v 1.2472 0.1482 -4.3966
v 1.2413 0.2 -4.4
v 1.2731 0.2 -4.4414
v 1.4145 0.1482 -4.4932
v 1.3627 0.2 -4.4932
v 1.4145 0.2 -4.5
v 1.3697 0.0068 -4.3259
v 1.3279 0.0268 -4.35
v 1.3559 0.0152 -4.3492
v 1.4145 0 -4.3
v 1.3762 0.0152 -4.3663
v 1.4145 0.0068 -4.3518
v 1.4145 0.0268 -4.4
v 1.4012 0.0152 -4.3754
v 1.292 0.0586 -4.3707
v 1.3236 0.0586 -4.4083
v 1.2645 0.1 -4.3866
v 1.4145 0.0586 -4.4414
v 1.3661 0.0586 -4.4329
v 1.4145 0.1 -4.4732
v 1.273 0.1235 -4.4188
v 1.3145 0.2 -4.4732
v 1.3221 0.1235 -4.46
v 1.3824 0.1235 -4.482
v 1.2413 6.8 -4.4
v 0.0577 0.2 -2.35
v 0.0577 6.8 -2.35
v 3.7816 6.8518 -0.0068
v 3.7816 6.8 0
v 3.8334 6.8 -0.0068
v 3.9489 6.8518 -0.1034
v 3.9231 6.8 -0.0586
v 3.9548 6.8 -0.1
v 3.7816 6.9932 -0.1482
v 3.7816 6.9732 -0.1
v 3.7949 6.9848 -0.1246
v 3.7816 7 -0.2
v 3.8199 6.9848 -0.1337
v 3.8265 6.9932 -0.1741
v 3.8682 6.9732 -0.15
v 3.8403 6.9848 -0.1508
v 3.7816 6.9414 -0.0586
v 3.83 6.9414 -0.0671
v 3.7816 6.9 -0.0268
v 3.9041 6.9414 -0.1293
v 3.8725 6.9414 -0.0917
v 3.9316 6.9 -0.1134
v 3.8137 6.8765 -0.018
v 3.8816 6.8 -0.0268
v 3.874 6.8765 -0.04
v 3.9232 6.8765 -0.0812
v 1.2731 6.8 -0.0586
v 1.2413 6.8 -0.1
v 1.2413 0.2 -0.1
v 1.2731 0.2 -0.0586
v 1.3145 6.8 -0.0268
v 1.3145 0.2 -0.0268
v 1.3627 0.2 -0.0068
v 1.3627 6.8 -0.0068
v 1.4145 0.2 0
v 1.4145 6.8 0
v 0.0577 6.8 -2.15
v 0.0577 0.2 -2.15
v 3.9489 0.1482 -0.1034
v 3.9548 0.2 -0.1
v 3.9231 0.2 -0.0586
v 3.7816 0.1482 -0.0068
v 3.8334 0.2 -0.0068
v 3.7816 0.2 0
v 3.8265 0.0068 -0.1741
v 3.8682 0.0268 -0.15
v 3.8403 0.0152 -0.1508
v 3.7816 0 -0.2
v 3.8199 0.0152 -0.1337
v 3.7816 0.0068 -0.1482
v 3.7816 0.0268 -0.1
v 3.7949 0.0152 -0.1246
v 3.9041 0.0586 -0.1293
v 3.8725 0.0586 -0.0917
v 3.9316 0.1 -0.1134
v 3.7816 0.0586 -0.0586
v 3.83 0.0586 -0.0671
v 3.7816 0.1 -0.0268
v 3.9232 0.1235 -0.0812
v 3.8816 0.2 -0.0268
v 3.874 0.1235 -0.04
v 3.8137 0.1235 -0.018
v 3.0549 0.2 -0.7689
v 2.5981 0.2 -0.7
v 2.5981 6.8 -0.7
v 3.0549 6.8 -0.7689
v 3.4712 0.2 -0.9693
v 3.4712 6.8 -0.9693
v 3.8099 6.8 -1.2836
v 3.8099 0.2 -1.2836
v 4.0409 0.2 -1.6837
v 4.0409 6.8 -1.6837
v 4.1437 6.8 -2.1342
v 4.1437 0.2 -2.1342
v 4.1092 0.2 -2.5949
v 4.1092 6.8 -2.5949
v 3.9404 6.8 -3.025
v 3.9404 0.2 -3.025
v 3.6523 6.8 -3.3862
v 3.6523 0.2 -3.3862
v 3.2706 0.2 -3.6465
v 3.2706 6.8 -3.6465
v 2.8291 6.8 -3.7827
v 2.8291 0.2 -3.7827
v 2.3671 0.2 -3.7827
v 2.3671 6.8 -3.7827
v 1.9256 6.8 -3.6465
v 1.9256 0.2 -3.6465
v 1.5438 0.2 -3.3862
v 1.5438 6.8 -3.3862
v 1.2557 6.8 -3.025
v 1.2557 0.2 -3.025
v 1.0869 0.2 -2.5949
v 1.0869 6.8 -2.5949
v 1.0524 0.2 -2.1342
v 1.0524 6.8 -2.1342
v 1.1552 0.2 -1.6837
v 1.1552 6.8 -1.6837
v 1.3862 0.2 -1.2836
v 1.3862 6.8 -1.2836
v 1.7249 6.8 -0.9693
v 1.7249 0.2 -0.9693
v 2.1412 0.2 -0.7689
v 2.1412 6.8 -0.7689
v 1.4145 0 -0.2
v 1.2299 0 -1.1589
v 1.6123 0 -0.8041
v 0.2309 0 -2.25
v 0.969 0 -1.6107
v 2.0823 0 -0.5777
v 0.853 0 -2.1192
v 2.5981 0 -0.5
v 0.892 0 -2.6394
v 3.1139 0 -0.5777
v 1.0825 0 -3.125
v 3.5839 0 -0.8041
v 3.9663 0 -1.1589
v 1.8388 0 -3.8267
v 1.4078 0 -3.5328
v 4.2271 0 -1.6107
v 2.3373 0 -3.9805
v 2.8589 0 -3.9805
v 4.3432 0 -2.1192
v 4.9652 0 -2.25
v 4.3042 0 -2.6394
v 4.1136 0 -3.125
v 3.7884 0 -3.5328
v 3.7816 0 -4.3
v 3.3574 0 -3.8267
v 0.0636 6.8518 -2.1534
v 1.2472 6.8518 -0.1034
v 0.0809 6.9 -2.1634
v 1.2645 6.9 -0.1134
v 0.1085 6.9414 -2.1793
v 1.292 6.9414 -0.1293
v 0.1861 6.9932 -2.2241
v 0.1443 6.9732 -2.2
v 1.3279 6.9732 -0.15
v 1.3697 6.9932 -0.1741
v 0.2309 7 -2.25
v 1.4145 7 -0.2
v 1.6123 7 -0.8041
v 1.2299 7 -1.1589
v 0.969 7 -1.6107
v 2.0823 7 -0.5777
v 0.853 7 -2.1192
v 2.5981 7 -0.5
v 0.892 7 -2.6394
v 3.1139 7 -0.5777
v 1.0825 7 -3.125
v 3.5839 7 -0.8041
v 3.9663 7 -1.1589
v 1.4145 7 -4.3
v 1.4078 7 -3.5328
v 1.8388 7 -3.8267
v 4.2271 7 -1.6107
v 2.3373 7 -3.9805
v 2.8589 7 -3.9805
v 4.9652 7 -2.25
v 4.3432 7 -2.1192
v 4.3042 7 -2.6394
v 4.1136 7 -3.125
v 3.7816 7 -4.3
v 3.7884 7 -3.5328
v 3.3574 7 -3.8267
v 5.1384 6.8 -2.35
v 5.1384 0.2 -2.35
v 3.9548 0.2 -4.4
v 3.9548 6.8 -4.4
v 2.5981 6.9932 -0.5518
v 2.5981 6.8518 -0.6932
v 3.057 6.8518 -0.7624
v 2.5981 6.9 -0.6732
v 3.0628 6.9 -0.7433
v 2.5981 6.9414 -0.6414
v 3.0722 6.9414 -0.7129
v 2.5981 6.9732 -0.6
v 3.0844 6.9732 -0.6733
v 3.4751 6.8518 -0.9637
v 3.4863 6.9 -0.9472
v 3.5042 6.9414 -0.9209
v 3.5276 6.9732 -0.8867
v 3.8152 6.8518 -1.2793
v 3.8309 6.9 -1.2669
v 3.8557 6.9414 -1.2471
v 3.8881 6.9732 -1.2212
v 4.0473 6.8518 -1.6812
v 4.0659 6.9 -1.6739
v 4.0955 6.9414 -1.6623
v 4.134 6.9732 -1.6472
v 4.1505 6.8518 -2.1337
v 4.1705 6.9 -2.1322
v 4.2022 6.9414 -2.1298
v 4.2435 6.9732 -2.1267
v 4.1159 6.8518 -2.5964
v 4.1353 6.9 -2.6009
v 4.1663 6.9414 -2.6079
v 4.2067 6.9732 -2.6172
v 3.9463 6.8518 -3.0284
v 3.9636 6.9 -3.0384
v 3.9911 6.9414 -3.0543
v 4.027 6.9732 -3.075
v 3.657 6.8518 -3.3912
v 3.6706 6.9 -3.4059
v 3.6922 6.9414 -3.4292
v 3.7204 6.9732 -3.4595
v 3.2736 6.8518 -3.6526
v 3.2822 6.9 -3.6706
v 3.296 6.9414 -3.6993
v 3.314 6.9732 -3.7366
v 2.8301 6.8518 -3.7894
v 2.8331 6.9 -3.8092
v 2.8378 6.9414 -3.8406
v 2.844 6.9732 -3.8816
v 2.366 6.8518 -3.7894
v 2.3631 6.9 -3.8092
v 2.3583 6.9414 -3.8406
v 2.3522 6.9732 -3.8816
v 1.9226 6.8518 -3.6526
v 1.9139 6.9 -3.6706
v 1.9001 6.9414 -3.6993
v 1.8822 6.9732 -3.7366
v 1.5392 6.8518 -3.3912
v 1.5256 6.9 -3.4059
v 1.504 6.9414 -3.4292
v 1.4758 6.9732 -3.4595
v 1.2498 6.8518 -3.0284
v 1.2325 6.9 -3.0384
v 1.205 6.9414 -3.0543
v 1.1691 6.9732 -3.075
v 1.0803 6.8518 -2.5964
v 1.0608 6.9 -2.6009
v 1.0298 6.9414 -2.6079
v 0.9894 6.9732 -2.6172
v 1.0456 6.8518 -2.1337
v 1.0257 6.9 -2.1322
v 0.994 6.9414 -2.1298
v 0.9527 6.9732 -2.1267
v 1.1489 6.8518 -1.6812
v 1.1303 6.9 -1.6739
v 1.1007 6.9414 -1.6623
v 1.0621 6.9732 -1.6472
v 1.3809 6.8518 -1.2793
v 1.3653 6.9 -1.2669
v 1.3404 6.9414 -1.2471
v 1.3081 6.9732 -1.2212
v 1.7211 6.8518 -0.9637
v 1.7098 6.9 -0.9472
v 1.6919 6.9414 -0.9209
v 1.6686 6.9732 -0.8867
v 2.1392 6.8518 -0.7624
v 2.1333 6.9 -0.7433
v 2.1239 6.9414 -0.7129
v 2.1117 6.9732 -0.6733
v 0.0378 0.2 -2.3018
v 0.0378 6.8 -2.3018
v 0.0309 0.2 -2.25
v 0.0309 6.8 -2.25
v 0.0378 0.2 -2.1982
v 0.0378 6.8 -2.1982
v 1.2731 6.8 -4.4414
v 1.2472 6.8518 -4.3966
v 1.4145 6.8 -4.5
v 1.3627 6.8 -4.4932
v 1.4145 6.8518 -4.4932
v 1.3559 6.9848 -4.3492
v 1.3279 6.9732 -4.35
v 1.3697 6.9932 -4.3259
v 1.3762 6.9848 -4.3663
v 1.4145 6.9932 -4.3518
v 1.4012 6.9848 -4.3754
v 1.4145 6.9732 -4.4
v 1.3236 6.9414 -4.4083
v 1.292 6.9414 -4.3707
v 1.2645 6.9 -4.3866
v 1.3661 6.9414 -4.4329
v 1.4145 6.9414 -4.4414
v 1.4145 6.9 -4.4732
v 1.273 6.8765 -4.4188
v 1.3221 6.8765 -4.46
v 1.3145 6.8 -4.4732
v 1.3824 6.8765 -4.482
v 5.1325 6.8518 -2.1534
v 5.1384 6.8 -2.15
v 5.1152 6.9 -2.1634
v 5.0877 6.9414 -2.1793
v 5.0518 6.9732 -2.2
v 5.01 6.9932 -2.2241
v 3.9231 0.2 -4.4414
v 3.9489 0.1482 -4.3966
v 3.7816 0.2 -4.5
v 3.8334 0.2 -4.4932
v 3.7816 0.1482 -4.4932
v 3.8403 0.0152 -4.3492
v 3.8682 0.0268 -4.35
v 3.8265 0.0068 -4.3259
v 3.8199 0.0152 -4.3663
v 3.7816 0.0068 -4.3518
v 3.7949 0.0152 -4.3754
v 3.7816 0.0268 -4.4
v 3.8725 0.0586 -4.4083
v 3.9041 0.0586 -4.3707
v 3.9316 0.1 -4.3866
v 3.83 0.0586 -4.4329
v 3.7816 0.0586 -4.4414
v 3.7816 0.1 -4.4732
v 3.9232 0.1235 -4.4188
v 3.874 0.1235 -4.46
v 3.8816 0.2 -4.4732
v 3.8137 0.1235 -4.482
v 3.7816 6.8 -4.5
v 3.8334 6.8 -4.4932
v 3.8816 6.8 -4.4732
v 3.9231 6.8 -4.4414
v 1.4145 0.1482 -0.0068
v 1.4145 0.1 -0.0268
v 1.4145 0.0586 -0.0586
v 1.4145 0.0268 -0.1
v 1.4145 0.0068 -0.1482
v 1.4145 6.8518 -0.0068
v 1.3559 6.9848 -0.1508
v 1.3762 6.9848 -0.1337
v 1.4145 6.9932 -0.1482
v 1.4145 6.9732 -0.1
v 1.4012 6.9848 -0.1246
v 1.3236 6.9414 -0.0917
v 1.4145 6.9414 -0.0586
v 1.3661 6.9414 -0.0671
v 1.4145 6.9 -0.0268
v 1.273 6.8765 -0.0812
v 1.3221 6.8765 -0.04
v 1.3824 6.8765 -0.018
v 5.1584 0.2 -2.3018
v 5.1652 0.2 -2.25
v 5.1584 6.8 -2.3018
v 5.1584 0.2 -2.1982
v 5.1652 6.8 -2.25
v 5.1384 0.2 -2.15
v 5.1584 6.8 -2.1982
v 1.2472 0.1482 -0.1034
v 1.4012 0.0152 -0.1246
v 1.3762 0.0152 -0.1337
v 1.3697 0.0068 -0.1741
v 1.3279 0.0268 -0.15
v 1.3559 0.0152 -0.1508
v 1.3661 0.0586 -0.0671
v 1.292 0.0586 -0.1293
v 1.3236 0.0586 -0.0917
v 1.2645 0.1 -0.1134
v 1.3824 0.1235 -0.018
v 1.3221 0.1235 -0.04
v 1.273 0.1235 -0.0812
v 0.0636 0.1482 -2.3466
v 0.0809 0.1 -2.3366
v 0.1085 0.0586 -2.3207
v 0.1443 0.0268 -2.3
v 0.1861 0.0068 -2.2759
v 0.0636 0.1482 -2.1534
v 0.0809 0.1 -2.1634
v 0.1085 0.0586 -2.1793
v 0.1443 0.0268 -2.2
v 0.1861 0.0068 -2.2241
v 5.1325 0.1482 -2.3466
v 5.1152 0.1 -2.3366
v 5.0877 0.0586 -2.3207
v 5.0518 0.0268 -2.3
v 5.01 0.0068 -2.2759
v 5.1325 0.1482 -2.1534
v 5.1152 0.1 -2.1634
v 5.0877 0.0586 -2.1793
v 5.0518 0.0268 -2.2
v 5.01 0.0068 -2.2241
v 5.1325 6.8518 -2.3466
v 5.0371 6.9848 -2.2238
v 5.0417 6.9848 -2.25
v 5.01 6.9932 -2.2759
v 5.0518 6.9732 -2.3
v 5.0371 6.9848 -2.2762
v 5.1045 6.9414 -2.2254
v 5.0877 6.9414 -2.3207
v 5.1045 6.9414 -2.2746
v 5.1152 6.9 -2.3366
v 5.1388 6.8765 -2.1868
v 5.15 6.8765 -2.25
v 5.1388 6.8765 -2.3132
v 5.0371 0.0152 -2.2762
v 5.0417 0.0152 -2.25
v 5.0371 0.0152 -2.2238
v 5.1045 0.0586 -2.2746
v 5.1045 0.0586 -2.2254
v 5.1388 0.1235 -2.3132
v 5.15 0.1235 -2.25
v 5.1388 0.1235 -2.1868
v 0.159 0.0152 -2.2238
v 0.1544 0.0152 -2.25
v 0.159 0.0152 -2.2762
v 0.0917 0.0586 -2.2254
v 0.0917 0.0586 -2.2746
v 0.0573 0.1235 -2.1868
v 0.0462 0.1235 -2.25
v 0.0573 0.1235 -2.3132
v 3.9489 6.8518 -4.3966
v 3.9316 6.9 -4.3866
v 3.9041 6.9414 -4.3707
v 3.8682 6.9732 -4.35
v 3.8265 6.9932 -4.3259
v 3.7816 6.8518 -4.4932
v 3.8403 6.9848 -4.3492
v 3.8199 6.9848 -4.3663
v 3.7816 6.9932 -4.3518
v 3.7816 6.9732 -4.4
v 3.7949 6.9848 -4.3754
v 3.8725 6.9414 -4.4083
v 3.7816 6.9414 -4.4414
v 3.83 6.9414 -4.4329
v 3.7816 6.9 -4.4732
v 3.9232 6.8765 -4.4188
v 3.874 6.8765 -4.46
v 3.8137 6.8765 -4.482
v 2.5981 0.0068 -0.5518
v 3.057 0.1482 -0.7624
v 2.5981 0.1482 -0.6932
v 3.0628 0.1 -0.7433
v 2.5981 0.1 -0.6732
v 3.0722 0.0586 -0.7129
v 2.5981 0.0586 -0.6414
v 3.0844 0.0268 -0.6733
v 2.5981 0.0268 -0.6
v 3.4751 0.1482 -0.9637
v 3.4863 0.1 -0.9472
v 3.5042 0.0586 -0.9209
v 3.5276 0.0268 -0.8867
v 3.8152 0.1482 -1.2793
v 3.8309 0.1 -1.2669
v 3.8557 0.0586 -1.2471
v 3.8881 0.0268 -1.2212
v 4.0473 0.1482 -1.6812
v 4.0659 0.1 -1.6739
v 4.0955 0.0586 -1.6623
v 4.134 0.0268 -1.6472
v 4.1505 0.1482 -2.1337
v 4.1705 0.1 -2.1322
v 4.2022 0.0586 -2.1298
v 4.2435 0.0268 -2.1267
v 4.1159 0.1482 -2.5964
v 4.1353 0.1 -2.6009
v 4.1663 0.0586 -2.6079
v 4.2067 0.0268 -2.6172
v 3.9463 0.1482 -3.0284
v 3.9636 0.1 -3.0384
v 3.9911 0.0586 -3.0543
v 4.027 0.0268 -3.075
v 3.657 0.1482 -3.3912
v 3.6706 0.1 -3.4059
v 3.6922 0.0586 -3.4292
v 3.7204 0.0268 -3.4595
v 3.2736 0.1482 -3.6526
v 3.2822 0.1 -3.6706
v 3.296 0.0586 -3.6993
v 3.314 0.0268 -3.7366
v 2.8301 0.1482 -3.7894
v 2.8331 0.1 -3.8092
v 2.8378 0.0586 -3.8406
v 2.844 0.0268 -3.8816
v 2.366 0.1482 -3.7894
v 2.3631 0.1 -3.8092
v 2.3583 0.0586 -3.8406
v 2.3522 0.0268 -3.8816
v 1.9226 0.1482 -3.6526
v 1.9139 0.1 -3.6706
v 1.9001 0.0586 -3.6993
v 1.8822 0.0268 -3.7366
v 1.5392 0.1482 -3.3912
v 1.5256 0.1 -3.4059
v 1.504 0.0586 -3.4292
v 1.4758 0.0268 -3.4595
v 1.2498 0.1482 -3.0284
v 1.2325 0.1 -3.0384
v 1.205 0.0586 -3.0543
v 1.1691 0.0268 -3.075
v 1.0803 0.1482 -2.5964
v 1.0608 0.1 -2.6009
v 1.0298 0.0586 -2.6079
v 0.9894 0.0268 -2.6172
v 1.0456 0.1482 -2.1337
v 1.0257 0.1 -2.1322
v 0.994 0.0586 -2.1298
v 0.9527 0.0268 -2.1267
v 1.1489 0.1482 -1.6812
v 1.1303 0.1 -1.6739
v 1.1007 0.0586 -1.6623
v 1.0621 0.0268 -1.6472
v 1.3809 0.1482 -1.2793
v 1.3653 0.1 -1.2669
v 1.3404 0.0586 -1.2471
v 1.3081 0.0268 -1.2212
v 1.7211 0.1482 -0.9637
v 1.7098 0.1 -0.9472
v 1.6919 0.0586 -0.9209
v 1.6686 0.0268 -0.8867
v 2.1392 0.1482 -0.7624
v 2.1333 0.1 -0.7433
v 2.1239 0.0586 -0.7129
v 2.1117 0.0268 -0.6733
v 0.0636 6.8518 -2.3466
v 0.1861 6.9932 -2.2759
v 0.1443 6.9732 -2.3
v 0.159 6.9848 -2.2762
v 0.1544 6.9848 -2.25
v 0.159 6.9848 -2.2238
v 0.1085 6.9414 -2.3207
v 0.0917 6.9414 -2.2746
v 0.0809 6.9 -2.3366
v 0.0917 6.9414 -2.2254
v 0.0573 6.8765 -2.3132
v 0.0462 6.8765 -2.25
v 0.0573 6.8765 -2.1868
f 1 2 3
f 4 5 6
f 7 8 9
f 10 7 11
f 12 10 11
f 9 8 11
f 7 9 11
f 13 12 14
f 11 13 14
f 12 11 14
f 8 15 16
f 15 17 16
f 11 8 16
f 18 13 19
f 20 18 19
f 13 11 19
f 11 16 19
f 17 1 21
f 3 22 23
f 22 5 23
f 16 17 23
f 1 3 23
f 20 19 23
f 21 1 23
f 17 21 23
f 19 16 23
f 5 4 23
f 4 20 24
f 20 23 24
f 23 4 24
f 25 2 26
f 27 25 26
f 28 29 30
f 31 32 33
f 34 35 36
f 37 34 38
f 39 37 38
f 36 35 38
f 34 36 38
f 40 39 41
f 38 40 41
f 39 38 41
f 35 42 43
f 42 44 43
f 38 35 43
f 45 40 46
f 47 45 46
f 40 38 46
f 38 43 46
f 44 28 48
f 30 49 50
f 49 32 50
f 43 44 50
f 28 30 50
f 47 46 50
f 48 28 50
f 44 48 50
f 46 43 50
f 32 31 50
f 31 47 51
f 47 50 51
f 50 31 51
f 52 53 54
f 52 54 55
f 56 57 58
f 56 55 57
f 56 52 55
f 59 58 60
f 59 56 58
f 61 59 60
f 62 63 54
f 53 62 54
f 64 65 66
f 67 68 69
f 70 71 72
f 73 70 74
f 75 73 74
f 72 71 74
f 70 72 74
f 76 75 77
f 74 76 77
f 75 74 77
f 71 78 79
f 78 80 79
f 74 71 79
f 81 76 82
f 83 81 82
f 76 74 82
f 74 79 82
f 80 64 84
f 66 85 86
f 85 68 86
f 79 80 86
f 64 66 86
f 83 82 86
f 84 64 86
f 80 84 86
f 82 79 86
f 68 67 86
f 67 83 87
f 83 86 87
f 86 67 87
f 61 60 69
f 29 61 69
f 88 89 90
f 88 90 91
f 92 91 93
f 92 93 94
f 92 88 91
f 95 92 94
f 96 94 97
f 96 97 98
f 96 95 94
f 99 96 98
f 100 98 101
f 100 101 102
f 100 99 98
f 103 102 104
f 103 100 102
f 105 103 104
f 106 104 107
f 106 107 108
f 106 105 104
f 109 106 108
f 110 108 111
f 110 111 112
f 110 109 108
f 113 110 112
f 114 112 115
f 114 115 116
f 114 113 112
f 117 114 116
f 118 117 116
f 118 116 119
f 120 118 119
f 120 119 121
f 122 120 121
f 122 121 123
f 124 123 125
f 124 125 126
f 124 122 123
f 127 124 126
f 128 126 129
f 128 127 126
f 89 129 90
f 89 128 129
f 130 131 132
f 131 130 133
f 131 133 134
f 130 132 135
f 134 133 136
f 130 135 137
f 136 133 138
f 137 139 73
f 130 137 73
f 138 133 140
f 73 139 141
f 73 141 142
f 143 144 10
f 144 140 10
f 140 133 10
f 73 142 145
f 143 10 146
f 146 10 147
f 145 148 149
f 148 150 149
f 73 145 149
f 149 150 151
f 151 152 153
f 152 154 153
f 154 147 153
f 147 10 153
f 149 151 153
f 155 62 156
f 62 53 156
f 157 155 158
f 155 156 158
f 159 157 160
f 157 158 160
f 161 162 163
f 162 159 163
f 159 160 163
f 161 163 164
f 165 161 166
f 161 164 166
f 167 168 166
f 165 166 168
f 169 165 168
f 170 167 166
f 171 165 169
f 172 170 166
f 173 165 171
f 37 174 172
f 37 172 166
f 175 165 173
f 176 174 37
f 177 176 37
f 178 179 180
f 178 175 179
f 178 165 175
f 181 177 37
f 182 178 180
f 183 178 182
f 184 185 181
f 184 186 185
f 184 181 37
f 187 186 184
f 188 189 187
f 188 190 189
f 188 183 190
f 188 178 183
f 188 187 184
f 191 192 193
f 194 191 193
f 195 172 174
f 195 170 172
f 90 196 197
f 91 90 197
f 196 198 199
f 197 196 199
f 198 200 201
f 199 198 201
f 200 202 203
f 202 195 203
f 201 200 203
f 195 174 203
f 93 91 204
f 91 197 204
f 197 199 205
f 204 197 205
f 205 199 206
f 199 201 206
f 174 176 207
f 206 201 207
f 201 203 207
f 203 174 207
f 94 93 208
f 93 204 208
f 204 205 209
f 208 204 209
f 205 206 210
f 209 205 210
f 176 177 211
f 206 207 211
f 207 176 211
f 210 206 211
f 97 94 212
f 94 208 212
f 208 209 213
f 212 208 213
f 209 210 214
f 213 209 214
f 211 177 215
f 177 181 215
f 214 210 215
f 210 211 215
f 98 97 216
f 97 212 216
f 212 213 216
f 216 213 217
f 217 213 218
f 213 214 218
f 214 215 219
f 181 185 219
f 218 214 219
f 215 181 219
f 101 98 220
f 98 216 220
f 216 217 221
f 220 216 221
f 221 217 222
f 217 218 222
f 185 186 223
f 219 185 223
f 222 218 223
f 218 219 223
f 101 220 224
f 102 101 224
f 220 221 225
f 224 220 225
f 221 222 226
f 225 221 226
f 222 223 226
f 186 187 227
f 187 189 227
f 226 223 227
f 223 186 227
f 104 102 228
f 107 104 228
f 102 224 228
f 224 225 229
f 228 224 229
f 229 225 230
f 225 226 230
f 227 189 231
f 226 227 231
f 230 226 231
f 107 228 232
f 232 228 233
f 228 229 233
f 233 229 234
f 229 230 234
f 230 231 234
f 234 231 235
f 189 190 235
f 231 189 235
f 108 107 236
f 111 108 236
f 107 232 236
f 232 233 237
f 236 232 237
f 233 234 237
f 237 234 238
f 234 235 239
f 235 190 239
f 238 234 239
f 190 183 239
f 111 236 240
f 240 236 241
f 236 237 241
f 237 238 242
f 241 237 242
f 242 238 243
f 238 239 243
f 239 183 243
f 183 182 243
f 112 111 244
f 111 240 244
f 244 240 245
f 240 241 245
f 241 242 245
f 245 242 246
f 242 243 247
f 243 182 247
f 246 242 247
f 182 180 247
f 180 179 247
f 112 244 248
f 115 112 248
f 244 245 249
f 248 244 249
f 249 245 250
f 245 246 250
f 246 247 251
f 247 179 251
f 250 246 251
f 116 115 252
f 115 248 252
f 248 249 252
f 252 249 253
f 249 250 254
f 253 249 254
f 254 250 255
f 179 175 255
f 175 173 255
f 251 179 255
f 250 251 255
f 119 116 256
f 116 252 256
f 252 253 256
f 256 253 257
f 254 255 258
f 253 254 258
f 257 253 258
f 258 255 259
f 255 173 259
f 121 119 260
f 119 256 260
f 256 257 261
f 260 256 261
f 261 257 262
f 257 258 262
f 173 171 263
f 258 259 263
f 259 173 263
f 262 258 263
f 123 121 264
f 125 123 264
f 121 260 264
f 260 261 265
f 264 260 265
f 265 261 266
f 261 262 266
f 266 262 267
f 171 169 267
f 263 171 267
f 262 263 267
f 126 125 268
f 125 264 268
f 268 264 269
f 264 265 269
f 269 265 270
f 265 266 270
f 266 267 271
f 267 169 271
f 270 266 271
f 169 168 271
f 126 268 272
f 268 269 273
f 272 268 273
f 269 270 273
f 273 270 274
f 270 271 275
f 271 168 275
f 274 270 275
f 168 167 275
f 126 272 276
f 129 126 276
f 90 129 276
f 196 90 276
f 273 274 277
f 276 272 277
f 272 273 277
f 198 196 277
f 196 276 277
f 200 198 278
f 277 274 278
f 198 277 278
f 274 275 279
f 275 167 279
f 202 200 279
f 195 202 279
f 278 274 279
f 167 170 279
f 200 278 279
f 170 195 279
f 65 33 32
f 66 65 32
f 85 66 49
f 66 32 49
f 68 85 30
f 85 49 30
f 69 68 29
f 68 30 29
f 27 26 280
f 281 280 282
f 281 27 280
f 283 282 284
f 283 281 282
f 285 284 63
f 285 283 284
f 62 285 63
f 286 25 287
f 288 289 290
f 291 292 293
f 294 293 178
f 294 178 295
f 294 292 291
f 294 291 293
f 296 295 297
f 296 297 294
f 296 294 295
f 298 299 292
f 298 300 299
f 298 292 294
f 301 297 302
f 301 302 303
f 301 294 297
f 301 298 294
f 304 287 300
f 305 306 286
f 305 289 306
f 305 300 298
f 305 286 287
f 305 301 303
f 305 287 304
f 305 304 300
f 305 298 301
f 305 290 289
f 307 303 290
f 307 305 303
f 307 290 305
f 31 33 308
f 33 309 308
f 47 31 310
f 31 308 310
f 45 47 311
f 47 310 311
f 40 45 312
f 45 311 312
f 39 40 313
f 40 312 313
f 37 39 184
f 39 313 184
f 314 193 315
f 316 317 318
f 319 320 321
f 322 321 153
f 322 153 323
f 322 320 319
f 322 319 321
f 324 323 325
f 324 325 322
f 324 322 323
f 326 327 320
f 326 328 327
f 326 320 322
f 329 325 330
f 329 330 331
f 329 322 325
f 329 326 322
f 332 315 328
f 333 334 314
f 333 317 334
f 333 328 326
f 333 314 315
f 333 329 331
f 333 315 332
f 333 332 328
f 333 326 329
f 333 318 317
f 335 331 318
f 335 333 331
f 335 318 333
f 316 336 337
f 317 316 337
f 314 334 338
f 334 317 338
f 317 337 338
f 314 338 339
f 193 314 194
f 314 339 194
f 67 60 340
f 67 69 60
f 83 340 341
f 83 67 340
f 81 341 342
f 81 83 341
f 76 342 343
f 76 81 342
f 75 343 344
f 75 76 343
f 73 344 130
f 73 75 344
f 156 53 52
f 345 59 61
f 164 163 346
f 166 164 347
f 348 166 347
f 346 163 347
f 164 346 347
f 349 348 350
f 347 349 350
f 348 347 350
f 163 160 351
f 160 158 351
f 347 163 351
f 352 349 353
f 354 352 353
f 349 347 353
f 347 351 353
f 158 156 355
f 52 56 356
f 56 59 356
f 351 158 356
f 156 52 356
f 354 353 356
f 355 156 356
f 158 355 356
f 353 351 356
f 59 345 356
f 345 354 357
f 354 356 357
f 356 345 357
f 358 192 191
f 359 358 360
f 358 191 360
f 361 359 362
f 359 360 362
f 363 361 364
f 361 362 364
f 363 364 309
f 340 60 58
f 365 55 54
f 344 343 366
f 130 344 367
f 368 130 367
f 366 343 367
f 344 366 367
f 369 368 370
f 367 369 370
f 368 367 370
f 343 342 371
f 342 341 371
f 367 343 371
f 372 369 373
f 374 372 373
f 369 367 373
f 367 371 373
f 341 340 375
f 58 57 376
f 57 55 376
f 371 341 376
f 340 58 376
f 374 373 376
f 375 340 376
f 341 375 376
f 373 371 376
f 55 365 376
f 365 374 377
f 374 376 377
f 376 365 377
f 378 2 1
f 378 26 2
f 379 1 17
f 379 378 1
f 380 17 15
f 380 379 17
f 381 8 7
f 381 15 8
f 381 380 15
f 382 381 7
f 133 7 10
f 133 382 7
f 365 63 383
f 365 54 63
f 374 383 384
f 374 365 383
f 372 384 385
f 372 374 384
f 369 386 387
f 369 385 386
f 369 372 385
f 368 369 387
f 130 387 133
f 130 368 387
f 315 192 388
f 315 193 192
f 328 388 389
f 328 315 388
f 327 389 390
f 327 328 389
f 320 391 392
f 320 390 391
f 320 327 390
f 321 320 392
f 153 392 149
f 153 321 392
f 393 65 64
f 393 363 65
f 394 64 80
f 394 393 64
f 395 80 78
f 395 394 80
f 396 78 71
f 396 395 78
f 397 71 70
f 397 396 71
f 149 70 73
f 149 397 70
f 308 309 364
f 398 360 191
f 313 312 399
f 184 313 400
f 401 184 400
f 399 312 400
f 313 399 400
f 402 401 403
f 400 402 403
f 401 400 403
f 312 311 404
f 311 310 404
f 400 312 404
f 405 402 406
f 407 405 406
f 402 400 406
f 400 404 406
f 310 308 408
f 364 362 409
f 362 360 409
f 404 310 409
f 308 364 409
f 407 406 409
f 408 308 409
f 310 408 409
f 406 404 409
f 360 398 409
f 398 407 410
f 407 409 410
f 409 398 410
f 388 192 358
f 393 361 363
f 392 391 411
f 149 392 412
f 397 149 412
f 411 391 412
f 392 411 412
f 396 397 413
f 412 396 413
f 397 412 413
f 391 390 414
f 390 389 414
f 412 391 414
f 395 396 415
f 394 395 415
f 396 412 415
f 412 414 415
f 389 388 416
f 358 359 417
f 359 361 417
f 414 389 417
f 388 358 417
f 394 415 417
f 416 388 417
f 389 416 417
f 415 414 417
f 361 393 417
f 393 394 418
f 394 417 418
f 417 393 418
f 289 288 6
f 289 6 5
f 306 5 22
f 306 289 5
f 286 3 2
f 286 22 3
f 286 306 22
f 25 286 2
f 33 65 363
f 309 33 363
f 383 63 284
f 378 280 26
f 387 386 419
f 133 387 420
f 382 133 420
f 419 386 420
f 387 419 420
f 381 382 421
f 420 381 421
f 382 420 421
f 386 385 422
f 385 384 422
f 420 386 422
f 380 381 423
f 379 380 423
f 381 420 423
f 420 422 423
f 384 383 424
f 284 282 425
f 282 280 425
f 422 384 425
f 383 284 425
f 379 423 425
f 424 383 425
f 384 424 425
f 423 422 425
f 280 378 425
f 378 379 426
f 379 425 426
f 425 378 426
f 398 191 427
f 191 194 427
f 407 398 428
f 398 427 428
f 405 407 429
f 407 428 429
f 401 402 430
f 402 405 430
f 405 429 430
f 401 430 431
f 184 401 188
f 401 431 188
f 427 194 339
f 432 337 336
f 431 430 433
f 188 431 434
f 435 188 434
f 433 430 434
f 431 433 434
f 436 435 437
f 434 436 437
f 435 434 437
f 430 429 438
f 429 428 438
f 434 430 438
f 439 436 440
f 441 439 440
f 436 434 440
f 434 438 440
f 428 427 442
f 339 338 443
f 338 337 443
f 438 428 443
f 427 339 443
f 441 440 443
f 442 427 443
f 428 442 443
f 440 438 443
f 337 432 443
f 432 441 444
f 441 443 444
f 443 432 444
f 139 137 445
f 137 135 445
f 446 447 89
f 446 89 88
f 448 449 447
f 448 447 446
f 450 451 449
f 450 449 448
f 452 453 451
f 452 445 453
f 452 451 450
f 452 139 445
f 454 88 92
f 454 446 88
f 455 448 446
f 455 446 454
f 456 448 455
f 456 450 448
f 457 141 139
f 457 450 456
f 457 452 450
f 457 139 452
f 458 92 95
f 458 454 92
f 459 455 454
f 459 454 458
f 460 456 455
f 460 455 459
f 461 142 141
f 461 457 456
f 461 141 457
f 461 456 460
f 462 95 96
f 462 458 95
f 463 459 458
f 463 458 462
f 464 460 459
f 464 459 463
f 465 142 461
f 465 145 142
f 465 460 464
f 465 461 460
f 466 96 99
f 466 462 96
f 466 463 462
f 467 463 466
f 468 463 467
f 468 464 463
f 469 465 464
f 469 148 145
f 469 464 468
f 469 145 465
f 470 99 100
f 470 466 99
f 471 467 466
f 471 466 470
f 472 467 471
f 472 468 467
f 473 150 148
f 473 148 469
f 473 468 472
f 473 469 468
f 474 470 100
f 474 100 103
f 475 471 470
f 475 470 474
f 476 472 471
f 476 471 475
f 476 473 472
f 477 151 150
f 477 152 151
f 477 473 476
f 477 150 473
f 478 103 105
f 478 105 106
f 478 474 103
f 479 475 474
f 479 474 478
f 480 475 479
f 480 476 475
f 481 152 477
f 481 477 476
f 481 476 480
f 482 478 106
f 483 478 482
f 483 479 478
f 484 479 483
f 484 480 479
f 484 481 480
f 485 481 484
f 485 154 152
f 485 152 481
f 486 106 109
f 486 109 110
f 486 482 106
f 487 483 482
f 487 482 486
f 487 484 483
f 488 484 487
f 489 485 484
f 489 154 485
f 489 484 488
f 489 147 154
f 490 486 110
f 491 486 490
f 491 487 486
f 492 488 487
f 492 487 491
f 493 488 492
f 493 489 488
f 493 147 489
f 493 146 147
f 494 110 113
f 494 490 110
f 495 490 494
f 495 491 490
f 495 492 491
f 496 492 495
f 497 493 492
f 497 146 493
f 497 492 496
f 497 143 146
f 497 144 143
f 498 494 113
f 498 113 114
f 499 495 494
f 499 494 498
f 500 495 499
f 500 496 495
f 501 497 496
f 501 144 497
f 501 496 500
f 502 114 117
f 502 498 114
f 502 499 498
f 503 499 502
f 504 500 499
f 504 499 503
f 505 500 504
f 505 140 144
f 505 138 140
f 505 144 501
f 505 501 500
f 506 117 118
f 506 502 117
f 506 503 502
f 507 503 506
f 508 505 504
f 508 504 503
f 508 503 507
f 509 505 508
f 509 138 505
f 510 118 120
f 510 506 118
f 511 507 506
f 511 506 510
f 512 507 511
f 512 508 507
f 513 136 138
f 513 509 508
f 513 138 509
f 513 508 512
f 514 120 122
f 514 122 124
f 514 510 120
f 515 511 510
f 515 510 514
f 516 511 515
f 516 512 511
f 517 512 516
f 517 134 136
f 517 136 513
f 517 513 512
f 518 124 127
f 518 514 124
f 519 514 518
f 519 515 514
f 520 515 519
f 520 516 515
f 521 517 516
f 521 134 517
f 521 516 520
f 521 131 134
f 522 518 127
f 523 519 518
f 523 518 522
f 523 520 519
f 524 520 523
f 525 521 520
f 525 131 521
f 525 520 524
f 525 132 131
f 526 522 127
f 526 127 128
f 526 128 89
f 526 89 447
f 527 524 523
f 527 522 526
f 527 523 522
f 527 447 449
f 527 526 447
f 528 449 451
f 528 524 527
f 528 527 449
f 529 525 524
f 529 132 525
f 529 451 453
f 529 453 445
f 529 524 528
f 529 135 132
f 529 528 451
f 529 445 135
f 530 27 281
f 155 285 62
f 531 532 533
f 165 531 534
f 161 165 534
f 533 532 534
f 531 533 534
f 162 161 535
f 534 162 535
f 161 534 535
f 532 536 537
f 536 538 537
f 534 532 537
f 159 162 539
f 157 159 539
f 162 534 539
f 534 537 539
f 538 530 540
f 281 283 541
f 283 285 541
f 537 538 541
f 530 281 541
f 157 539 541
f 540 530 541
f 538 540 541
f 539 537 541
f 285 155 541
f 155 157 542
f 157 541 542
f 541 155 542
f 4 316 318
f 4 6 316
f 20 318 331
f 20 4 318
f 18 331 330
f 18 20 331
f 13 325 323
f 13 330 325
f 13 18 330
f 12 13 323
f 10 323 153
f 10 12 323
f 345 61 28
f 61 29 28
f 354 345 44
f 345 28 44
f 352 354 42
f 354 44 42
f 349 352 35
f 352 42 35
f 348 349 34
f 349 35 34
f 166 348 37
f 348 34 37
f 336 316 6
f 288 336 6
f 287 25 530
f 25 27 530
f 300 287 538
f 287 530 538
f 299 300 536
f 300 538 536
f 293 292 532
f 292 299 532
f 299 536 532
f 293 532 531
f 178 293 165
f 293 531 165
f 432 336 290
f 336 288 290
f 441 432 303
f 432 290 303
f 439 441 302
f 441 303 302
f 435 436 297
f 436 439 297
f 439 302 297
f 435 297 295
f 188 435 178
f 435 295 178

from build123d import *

# Parameters (mm, degrees)
SKETCH1_R           = 1.55
BOSS_EXTRUDE1_DEPTH = 7
FILLET1_R           = 0.2


with BuildPart() as part:
    # Sketch1 → Boss-Extrude1 (new body)
    with BuildSketch(Plane(origin=(0, 0, 0), x_dir=(1, 0, 0), z_dir=(0, 1, 0))):
        Polygon((3.897114317, 4.5), (1.299038106, 4.5), (0, 2.25), (1.299038106, 0), (3.897114317, 0), (5.196152423, 2.25), align=None)
        with Locations(Location((2.598076211, 2.25, 0), (0, 0, 270))):
            Circle(SKETCH1_R, mode=Mode.SUBTRACT)
    extrude(amount=BOSS_EXTRUDE1_DEPTH)

    # Fillet1
    fillet1_edges = [part.edges().sort_by_distance(p)[0] for p in [
        (0.649519053, 0, -1.125),
        (0.649519053, 0, -3.375),
        (2.598076211, 0, -4.5),
        (2.598076211, 0, -3.8),
        (2.598076211, 7, -4.5),
        (3.897114317, 3.5, -4.5),
        (5.196152423, 3.5, -2.25),
        (3.897114317, 3.5, 0),
        (1.299038106, 3.5, 0),
        (0, 3.5, -2.25),
        (1.299038106, 3.5, -4.5),
        (0.649519053, 7, -3.375),
        (0.649519053, 7, -1.125),
        (2.598076211, 7, 0),
        (4.54663337, 7, -1.125),
        (4.54663337, 7, -3.375),
        (2.598076211, 7, -3.8),
        (4.54663337, 0, -3.375),
        (4.54663337, 0, -1.125),
        (2.598076211, 0, 0),
    ]]
    fillet(fillet1_edges, radius=FILLET1_R)


solid = part.part
